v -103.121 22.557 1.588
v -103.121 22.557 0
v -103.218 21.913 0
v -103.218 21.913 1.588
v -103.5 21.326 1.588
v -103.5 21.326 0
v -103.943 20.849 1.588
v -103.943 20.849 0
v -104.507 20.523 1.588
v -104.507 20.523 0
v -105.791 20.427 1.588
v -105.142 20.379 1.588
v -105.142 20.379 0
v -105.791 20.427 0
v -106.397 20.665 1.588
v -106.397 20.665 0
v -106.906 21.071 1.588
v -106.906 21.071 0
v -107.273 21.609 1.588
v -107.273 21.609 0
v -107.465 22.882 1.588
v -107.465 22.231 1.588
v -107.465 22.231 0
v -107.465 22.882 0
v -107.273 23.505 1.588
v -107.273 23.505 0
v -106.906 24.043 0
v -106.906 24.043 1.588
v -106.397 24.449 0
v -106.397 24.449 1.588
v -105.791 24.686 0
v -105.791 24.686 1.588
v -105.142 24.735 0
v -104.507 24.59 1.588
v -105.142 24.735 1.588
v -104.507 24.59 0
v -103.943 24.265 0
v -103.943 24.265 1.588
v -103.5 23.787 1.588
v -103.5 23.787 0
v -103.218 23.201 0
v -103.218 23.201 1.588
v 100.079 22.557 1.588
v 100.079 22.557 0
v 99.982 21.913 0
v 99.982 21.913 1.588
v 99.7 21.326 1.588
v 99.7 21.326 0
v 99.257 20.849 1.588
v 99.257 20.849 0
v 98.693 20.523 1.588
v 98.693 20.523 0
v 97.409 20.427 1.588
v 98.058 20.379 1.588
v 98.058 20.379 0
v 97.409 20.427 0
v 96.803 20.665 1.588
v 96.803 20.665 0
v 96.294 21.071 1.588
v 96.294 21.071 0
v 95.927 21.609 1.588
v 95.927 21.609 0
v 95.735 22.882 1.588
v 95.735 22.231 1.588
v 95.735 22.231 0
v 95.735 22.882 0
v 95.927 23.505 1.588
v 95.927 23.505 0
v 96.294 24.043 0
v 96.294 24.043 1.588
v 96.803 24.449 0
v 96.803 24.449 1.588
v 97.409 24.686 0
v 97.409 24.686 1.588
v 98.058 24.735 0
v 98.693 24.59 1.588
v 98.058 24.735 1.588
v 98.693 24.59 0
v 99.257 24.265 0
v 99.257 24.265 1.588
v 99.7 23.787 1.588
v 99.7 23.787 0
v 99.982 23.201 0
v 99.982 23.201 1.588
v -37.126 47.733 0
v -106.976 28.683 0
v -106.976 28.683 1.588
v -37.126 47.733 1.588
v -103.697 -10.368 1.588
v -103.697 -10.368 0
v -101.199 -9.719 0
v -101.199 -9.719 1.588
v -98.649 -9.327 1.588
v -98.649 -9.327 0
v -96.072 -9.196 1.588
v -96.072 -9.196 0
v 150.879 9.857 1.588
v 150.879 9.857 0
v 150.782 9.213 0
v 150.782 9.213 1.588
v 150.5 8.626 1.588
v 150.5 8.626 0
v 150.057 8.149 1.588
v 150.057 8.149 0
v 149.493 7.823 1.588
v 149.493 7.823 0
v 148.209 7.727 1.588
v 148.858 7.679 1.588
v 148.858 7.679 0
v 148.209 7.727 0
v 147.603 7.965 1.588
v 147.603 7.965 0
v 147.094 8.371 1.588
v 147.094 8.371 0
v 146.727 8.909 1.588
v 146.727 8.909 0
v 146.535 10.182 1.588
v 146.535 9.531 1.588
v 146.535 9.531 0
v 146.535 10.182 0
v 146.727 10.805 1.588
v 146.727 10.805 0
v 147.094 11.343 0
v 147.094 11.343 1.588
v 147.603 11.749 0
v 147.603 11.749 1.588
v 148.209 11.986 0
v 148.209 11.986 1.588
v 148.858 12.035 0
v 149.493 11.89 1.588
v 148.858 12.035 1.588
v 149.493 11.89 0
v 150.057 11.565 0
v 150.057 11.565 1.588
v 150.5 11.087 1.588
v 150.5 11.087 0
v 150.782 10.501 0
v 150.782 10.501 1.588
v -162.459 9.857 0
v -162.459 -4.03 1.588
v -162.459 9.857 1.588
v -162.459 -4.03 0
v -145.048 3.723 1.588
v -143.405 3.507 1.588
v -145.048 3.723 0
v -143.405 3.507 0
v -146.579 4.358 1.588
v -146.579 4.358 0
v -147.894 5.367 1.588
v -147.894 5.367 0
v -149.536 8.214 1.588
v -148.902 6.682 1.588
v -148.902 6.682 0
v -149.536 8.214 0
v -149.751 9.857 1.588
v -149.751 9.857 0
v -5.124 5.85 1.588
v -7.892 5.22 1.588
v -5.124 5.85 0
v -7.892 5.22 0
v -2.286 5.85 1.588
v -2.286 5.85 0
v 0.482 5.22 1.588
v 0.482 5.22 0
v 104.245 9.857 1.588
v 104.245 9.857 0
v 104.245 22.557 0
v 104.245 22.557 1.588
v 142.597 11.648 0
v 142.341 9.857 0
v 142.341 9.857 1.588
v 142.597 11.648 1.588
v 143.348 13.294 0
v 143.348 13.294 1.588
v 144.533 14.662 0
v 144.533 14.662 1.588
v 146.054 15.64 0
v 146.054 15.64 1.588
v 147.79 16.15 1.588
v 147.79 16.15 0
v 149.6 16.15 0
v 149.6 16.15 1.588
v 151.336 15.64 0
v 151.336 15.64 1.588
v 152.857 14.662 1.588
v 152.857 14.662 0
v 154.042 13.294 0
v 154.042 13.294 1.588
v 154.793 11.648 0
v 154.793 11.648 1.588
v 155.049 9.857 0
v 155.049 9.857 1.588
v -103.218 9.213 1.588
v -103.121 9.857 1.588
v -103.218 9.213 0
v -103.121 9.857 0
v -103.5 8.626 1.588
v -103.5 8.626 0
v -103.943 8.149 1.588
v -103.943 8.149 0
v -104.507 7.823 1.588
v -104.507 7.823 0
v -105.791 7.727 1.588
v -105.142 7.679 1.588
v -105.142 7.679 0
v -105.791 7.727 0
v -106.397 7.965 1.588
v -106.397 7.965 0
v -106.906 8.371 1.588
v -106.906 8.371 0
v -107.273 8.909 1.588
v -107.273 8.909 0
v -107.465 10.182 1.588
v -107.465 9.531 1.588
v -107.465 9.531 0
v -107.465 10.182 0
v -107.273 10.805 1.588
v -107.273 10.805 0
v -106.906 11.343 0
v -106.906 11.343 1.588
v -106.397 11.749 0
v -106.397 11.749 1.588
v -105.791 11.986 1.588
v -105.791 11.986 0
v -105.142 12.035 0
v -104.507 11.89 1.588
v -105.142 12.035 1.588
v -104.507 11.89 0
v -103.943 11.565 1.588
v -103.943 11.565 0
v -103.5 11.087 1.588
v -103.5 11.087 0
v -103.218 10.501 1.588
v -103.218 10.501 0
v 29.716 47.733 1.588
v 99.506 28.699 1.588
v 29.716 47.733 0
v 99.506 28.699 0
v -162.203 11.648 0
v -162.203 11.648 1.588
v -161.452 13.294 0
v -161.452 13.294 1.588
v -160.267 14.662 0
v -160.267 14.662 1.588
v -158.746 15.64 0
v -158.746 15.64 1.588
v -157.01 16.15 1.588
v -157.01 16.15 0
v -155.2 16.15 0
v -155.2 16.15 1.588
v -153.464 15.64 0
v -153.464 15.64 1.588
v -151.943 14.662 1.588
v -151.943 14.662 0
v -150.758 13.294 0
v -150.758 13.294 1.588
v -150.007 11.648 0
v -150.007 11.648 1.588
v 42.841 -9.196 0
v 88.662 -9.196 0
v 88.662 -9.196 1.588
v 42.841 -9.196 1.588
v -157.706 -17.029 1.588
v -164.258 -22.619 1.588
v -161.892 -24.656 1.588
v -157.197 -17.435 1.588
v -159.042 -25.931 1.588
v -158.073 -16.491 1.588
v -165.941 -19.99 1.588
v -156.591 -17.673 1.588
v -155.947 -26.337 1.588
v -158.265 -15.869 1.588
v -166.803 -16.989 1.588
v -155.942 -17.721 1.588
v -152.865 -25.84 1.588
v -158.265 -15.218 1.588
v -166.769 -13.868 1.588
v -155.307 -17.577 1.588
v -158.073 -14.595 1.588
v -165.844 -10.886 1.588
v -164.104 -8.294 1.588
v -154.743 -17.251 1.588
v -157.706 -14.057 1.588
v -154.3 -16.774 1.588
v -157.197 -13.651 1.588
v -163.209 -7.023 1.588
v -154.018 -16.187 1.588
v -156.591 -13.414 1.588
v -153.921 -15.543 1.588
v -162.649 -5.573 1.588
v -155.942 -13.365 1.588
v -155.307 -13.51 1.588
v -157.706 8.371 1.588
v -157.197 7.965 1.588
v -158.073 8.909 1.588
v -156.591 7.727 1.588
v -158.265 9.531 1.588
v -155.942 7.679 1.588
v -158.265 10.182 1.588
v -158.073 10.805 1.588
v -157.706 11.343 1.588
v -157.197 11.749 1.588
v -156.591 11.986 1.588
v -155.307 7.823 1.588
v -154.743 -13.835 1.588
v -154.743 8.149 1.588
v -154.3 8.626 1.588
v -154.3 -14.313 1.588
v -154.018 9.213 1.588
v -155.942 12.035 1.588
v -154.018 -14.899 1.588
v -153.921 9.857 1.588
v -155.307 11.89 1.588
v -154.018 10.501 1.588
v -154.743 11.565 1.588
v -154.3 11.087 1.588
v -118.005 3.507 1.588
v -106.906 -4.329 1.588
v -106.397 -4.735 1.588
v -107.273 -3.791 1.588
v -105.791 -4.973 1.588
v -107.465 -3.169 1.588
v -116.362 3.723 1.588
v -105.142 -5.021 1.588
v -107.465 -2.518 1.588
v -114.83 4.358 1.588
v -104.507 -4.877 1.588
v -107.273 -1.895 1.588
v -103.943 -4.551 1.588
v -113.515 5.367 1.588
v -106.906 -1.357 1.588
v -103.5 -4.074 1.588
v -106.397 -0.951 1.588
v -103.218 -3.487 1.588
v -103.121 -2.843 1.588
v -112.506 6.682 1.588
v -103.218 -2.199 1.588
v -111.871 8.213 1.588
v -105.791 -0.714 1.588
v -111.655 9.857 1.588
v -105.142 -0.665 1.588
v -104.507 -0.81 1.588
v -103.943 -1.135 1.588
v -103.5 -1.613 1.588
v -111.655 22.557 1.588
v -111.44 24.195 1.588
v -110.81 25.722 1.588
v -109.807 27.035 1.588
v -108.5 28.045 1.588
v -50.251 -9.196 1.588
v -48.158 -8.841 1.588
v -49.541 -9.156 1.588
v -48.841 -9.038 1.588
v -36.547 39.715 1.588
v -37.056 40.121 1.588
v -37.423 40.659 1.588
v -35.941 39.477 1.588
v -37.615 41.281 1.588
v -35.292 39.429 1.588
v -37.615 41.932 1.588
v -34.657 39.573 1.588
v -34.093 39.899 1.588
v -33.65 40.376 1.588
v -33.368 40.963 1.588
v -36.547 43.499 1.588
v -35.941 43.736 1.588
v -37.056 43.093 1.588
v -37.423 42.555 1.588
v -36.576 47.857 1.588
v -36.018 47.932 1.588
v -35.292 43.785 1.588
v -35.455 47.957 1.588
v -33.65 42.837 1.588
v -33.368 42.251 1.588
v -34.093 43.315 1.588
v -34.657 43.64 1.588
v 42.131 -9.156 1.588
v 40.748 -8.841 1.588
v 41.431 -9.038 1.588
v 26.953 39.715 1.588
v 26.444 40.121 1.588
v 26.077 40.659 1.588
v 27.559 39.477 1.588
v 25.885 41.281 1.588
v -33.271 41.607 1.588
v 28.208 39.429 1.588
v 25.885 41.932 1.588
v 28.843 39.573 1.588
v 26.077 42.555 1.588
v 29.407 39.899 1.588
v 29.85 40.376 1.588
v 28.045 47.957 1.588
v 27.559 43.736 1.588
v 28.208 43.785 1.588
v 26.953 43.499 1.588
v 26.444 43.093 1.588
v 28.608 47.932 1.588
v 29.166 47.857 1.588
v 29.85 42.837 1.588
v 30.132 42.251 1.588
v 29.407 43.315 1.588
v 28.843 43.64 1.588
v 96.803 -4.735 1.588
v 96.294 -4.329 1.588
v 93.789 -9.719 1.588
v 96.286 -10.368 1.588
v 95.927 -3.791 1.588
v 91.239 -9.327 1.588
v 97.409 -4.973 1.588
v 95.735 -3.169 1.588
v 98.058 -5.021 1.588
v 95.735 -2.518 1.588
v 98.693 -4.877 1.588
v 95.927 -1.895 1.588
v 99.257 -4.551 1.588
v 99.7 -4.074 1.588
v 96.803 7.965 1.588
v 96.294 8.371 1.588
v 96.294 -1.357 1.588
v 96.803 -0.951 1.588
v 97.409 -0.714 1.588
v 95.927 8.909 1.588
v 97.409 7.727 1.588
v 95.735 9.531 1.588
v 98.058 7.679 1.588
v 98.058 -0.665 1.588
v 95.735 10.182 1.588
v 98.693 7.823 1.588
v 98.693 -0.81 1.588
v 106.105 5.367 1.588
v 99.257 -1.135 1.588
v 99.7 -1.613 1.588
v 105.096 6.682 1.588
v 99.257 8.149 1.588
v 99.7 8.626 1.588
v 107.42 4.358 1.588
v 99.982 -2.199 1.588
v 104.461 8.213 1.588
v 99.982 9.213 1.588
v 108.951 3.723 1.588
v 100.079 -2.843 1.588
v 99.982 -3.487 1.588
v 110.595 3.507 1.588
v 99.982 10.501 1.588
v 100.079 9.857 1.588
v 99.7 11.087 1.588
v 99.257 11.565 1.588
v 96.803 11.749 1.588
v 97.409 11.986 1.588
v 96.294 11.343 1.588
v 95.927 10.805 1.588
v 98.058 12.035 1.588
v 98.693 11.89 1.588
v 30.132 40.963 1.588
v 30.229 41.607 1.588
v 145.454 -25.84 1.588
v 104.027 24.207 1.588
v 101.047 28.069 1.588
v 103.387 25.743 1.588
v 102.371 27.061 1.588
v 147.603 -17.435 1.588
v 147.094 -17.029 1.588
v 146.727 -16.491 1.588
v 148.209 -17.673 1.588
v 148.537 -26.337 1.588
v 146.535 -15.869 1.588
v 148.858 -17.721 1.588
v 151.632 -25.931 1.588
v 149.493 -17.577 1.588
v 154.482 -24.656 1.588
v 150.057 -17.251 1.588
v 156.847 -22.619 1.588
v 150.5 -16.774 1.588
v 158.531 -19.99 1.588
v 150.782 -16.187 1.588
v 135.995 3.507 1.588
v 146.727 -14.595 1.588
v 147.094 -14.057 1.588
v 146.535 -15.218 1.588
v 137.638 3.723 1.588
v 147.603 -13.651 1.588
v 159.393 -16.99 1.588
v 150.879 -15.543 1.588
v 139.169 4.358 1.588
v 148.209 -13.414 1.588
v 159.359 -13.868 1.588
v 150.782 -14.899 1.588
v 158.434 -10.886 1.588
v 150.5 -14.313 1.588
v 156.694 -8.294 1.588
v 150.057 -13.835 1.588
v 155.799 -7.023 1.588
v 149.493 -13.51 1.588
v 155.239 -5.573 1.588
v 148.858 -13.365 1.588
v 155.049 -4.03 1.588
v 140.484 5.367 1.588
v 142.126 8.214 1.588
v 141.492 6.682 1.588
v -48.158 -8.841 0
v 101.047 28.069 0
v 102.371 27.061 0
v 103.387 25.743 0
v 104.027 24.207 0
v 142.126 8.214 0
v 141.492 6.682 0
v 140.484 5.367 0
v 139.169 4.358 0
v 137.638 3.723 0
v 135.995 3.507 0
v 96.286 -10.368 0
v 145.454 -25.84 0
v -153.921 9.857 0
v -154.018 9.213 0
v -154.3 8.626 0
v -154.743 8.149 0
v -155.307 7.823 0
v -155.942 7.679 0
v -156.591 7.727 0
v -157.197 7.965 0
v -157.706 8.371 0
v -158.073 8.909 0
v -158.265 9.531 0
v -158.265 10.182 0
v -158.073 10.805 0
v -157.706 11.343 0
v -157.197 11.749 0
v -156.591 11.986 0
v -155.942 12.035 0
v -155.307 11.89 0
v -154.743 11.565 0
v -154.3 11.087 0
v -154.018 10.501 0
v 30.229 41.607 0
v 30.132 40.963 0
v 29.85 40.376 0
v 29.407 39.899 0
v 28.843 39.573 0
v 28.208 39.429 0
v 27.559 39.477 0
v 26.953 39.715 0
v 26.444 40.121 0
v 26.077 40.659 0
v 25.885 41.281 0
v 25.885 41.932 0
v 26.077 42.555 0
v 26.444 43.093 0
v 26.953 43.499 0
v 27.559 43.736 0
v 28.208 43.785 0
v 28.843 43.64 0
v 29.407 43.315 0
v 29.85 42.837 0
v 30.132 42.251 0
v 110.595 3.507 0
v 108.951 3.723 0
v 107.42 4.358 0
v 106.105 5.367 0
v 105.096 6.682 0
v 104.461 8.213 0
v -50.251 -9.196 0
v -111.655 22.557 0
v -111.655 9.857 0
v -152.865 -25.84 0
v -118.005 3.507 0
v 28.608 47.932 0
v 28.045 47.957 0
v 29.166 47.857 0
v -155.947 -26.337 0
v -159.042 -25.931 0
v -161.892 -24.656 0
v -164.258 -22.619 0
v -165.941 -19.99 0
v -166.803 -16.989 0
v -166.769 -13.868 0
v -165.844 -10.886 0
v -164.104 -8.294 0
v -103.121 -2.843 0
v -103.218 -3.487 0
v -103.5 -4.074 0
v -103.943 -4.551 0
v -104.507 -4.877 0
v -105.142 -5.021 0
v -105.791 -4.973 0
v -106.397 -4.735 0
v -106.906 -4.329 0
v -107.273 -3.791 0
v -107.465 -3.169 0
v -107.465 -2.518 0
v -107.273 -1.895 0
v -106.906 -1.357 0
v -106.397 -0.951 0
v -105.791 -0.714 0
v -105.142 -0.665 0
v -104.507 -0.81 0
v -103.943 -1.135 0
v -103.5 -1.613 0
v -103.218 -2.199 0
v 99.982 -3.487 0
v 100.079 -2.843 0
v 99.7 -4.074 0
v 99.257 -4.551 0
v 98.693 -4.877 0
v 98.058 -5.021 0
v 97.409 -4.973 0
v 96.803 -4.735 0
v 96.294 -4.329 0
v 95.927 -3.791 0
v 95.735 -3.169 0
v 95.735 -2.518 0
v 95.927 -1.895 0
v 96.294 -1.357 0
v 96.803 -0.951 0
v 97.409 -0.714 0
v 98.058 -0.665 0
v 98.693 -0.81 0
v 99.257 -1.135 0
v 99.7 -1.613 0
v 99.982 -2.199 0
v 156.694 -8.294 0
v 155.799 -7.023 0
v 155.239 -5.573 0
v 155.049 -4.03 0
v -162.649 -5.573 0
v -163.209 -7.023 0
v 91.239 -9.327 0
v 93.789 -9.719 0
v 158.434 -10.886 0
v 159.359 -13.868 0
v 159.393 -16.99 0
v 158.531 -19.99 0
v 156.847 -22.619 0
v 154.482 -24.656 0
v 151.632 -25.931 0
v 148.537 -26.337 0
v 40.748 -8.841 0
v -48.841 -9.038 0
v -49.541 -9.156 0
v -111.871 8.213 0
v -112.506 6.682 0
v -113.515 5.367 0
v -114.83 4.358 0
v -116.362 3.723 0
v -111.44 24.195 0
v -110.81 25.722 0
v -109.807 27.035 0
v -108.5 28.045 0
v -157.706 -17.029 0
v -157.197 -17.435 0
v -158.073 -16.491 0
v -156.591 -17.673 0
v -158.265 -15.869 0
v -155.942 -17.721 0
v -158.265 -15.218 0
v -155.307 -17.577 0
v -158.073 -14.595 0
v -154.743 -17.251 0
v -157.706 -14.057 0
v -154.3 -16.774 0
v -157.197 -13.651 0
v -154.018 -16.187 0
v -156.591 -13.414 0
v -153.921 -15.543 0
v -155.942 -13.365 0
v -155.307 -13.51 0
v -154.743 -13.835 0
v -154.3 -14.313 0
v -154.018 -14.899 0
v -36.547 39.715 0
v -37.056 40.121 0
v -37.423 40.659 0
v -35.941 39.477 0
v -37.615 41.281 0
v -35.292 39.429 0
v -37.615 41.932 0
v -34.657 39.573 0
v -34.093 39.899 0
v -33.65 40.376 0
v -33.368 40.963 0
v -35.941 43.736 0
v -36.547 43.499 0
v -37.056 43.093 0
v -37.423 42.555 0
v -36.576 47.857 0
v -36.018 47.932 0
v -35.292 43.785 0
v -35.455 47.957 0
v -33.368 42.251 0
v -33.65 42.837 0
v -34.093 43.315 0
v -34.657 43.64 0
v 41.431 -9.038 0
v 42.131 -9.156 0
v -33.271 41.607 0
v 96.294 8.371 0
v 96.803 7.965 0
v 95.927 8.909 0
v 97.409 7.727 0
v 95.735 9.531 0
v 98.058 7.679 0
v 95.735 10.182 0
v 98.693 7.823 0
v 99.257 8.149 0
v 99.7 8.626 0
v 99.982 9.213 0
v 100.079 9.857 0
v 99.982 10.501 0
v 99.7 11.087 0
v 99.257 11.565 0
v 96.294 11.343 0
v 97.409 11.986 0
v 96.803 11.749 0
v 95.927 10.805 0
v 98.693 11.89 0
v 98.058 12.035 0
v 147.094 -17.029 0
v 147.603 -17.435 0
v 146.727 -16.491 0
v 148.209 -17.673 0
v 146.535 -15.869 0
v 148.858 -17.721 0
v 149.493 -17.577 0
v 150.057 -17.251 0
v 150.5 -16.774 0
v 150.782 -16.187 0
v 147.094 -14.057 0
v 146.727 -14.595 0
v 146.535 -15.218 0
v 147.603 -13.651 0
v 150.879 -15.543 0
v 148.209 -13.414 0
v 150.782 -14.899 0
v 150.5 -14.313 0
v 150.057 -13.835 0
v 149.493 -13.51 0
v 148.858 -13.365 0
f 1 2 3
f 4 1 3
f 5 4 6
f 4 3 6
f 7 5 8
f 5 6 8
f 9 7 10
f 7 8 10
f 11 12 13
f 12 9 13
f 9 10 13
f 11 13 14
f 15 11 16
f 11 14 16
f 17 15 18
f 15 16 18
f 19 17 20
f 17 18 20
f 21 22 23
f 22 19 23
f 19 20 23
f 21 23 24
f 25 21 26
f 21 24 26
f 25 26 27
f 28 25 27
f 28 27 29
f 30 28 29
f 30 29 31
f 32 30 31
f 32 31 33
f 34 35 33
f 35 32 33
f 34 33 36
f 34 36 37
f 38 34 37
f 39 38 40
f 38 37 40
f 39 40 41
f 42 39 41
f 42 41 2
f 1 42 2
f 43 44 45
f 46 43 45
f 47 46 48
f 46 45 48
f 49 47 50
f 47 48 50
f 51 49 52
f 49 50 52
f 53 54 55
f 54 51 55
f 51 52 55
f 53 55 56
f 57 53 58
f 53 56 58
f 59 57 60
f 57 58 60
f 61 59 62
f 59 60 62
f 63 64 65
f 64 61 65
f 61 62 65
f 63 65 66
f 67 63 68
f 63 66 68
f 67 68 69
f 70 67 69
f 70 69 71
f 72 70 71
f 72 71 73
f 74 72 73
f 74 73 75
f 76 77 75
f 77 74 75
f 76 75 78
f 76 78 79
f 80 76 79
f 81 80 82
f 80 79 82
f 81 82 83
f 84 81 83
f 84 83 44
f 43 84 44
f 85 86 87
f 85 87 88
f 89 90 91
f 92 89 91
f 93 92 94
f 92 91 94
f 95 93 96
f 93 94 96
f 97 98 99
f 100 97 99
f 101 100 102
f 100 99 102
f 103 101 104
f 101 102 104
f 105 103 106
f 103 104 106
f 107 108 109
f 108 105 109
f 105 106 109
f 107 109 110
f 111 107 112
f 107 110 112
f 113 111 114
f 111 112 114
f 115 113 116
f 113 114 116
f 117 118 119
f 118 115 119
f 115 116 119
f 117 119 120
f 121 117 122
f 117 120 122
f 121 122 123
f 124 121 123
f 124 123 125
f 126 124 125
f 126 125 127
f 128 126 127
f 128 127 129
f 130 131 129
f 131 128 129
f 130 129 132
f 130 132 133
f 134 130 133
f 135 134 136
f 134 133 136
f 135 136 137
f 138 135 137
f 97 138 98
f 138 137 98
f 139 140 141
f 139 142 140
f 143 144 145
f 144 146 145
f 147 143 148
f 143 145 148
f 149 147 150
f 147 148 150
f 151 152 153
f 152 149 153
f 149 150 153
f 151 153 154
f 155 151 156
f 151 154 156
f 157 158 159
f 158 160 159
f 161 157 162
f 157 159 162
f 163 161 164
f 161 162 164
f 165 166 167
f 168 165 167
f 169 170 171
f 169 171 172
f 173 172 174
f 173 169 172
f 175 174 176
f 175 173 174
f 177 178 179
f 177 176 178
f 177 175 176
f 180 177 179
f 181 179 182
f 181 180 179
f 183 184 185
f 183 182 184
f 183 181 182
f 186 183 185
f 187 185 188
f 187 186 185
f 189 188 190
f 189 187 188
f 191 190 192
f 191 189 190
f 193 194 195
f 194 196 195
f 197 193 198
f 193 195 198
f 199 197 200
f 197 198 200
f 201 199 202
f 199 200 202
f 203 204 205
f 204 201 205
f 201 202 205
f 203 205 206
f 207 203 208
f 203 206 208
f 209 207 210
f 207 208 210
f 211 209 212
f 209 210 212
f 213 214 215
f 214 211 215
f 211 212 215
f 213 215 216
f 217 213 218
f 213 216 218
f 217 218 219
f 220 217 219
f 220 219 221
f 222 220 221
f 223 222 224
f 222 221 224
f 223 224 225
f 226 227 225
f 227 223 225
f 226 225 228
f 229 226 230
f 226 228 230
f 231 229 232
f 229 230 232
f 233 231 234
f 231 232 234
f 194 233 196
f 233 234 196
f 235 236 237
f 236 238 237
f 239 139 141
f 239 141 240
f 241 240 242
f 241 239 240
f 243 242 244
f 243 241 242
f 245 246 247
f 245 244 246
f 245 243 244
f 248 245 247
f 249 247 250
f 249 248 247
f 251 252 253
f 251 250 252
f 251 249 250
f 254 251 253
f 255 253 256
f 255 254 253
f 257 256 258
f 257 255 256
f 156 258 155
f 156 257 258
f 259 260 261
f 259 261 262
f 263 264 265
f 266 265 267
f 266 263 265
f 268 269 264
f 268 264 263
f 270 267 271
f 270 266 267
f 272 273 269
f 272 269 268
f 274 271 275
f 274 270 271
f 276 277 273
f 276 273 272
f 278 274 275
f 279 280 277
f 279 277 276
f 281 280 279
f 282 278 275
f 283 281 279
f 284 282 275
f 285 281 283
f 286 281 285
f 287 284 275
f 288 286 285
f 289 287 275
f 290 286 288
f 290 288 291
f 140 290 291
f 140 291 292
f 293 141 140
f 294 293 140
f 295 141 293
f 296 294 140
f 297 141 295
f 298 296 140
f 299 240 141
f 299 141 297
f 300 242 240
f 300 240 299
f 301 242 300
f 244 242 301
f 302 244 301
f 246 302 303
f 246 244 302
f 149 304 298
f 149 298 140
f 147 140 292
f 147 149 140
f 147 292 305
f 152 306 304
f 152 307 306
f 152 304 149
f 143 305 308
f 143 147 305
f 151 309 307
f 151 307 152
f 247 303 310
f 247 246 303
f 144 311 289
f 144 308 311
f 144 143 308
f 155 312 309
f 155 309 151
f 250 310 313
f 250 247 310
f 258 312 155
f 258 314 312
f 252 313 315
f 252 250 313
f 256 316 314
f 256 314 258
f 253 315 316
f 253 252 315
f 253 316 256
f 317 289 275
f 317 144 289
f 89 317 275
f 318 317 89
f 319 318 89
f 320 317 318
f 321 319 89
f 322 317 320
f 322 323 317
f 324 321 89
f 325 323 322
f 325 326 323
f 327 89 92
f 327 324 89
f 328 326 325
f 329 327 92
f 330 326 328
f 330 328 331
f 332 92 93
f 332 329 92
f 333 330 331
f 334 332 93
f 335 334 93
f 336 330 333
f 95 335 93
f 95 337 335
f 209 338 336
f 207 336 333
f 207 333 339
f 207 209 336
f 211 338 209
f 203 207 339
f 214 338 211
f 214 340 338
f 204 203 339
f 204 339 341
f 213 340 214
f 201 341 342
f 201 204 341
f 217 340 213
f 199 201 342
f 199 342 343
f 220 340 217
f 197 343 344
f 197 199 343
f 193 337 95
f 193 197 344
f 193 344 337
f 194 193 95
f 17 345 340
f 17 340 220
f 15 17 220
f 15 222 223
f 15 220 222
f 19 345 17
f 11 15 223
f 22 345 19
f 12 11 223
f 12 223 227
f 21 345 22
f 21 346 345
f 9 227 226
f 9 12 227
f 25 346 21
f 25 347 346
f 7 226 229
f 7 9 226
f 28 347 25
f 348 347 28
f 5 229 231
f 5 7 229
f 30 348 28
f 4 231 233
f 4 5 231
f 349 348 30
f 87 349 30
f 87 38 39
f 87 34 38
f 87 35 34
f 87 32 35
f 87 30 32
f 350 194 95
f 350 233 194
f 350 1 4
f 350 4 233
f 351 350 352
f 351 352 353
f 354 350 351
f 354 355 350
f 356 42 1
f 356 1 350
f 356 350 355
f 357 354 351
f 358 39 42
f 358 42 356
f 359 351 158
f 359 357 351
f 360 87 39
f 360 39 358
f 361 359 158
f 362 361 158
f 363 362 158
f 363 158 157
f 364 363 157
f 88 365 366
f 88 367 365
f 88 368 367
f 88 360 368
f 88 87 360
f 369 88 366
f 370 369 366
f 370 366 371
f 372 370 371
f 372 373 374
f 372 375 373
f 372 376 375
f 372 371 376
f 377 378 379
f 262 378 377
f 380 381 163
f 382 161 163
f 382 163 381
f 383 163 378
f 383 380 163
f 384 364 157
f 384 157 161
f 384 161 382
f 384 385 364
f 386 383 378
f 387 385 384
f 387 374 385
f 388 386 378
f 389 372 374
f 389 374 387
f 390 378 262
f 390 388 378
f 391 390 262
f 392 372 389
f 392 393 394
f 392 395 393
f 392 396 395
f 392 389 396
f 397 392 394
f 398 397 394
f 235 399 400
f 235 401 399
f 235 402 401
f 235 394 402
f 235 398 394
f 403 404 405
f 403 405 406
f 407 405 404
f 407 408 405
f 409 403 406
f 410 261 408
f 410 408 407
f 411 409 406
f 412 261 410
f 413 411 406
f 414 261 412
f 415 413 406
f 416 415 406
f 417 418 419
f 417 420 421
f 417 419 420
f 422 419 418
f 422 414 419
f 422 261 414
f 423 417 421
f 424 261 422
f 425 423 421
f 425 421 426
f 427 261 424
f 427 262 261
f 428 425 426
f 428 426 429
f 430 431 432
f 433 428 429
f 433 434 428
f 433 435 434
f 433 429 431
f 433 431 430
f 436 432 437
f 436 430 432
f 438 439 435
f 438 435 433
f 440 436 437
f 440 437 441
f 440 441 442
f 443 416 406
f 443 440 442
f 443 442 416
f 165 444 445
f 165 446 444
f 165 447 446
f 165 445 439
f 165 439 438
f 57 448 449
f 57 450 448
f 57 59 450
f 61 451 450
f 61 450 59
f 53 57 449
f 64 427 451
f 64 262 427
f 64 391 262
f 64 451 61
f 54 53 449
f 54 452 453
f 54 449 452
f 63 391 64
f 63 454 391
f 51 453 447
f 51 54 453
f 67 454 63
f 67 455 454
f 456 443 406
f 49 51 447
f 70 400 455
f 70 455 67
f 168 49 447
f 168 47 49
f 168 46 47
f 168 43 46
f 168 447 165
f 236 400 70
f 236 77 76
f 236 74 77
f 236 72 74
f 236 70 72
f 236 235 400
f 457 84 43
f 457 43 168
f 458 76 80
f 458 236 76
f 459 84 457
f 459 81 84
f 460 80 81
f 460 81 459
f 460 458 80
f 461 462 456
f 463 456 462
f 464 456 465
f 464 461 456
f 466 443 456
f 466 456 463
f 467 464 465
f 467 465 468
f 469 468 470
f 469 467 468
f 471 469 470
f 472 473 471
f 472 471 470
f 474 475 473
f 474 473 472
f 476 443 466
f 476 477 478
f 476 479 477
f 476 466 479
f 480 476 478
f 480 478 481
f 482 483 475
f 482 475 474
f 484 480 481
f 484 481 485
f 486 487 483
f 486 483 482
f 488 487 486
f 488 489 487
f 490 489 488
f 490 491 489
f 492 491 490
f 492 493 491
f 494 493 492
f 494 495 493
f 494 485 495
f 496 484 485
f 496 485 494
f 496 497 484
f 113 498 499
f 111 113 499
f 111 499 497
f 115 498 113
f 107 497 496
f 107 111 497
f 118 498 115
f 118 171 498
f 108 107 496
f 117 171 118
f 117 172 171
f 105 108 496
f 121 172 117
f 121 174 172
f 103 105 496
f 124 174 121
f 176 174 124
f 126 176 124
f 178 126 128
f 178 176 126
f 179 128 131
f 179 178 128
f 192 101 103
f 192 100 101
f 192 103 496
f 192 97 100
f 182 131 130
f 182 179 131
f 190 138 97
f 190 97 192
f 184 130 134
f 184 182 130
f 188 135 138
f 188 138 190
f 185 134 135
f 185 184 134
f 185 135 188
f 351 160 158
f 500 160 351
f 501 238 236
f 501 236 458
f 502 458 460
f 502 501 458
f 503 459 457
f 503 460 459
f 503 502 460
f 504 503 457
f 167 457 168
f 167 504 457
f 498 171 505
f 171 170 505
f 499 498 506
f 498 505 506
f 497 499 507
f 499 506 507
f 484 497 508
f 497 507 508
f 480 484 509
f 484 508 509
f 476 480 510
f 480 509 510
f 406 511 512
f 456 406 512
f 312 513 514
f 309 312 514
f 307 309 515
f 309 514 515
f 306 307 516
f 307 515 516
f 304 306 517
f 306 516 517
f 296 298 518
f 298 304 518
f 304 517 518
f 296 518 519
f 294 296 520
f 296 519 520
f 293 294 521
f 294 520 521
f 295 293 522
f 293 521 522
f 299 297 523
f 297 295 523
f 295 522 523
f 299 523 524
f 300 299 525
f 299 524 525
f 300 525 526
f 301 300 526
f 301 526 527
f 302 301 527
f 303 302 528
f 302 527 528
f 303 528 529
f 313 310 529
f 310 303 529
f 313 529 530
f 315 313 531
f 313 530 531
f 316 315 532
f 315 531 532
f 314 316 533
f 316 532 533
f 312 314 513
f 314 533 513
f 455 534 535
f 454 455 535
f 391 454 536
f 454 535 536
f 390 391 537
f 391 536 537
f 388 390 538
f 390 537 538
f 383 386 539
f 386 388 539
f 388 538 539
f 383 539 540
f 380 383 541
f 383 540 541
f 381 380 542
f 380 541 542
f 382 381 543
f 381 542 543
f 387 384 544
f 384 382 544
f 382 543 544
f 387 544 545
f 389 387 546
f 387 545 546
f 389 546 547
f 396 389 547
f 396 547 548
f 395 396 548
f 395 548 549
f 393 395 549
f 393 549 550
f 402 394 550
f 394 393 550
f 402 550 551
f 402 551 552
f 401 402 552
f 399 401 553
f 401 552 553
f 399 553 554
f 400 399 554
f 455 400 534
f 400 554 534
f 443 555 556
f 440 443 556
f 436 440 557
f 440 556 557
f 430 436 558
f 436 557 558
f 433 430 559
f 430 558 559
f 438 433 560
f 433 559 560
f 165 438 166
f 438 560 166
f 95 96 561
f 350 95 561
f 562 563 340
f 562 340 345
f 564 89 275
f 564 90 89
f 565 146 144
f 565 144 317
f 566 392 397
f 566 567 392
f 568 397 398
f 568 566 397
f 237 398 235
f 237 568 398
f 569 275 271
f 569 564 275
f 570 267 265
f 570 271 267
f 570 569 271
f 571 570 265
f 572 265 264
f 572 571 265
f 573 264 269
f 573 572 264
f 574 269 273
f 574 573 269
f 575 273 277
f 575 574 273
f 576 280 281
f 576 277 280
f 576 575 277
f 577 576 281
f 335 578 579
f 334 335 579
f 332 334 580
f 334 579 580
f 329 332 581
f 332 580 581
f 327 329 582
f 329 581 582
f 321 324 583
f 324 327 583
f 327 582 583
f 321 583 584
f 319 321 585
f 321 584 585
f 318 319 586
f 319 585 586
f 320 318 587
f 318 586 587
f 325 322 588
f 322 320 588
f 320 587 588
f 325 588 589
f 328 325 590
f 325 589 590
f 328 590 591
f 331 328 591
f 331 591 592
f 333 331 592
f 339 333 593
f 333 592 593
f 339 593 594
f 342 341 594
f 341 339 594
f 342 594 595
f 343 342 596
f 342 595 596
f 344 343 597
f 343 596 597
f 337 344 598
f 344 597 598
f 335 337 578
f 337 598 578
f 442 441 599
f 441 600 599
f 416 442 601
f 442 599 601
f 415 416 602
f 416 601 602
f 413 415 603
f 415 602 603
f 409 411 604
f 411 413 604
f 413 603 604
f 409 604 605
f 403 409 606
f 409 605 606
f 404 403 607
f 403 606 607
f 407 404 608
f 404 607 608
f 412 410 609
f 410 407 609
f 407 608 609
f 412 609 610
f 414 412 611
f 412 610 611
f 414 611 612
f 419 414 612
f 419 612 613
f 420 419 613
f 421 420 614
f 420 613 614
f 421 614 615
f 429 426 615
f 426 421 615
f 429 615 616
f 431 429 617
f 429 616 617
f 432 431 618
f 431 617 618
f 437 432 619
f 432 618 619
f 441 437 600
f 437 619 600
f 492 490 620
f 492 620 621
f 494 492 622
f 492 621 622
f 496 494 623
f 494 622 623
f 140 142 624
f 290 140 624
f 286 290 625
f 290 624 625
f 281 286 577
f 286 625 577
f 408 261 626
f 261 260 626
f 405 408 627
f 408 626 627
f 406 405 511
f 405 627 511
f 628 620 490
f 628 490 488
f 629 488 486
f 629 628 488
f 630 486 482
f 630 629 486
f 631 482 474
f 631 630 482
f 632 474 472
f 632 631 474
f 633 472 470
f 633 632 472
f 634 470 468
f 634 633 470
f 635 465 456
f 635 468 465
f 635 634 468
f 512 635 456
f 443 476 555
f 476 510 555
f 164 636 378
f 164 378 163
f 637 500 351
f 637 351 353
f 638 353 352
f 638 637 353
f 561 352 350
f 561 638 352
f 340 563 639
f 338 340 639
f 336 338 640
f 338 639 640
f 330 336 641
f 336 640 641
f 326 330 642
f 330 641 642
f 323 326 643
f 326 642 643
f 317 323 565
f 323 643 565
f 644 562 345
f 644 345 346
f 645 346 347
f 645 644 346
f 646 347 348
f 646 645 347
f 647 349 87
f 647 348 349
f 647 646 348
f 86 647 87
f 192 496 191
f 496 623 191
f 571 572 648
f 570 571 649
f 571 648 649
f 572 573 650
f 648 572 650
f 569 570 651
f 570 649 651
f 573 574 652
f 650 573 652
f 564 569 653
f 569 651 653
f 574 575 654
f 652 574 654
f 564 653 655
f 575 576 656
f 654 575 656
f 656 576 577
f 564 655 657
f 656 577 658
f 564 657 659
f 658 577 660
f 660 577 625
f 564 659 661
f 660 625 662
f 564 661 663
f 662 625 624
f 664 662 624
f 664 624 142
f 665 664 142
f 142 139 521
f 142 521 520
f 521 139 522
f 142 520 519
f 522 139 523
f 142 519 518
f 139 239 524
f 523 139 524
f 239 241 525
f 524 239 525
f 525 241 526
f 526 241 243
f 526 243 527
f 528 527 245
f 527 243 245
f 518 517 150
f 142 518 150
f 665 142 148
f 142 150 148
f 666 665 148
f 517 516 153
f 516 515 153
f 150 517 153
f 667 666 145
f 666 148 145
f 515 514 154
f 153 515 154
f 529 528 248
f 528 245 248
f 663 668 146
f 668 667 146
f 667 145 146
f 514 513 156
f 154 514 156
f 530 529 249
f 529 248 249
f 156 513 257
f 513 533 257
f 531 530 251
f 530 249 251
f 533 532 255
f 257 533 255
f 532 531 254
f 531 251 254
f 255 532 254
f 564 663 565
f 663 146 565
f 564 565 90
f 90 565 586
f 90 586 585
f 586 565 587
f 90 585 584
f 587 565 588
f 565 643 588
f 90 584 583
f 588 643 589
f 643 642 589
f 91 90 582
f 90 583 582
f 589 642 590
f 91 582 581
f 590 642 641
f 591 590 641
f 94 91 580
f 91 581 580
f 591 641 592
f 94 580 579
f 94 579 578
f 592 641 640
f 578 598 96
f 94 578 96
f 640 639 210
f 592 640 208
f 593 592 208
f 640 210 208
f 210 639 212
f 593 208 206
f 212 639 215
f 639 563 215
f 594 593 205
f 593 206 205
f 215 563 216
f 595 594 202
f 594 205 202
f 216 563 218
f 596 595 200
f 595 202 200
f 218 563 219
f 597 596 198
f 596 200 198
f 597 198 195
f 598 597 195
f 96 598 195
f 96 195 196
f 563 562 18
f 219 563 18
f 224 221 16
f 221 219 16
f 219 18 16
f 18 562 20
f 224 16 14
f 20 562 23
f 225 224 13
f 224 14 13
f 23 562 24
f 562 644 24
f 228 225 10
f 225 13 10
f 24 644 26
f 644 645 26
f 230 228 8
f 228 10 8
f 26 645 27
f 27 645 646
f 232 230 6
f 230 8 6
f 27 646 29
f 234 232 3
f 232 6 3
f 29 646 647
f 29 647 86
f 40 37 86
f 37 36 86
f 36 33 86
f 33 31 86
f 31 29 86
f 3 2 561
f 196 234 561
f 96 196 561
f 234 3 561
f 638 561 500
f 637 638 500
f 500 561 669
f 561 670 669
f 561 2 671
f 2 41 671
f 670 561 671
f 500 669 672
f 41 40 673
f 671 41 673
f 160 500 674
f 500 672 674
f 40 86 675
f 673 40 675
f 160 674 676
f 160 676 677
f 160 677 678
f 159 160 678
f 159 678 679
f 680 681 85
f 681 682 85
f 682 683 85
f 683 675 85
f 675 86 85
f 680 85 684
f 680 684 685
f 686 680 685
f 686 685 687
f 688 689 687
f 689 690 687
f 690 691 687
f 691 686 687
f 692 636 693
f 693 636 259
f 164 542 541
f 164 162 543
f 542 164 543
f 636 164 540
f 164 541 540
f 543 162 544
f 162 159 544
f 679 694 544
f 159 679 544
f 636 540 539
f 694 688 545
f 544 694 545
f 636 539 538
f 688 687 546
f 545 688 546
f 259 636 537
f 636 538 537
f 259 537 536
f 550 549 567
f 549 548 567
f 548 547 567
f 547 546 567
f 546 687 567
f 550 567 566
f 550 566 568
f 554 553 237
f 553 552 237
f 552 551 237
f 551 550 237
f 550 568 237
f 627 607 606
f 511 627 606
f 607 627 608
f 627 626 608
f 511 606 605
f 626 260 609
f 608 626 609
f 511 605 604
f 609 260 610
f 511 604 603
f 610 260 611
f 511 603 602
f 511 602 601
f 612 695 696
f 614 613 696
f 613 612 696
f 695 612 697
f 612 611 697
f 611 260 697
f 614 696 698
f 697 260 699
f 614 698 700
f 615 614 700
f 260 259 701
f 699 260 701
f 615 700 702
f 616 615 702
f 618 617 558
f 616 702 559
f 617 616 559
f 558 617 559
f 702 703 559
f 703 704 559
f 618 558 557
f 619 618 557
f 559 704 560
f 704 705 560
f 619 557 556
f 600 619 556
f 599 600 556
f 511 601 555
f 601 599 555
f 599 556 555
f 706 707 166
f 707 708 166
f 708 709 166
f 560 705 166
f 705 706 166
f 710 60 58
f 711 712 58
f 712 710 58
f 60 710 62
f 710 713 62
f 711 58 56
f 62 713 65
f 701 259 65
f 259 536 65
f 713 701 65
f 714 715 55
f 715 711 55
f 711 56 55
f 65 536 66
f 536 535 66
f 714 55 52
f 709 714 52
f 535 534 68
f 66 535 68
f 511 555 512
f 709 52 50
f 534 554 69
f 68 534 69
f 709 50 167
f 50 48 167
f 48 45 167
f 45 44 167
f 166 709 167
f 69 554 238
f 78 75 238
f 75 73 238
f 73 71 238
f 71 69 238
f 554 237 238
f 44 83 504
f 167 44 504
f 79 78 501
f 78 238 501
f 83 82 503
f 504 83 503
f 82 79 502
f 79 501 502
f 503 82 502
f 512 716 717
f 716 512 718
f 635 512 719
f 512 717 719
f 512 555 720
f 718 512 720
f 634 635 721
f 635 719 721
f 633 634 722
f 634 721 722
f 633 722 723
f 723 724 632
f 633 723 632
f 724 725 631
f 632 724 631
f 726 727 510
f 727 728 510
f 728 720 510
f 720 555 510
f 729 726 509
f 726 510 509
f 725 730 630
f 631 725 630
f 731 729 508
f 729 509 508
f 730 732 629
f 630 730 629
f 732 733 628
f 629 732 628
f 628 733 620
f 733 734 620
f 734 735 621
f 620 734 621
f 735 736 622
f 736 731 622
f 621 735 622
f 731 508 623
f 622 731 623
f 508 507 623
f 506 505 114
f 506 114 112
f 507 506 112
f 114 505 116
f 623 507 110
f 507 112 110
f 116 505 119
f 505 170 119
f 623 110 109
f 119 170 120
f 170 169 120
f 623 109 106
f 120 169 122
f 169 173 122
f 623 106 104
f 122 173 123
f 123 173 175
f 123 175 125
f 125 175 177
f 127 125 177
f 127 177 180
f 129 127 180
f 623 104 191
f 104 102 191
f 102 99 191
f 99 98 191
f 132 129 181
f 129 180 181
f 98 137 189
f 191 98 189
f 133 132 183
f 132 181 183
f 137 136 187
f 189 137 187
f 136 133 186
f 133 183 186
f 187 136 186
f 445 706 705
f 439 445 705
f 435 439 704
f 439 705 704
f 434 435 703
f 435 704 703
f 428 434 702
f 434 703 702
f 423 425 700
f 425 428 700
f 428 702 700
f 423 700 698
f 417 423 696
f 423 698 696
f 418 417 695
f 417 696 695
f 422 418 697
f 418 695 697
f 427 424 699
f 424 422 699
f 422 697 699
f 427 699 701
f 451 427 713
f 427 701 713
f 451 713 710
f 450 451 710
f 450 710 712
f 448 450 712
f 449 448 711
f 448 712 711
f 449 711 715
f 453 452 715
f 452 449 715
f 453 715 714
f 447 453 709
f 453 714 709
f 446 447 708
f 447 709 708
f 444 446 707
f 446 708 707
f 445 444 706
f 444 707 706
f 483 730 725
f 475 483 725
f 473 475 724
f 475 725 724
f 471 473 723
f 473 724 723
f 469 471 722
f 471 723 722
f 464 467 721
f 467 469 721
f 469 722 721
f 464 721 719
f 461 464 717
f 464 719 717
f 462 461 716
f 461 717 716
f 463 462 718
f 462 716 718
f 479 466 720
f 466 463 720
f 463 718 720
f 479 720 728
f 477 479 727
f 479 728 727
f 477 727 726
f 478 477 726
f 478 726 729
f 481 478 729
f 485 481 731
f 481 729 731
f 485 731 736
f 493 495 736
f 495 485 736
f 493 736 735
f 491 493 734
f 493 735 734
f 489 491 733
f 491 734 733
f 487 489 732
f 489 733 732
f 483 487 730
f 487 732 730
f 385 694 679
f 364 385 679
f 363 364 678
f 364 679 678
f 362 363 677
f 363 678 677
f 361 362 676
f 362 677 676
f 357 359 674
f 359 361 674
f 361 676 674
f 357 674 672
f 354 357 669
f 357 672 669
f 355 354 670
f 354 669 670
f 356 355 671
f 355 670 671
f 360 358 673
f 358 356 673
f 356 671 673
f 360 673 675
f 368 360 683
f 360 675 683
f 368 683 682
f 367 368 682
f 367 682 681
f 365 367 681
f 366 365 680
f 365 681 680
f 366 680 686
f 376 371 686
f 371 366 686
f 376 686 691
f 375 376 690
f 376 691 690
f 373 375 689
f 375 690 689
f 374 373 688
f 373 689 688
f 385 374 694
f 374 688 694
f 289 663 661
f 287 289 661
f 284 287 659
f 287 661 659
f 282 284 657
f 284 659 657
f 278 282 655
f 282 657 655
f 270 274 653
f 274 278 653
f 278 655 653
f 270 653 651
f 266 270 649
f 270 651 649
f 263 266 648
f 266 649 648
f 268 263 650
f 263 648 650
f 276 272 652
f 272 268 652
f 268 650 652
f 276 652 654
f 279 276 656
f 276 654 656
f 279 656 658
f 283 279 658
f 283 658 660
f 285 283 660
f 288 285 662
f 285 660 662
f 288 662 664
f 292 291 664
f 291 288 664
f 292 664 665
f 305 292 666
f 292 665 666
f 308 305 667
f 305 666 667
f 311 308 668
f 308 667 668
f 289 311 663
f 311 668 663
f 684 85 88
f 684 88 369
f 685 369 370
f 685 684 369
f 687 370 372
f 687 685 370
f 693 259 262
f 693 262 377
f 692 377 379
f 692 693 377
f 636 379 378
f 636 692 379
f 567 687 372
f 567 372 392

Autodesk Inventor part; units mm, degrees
ref_plane "YZ Plane" through (0, 0, 0) normal (1, 0, 0) x (0, 1, 0)
ref_plane "XZ Plane" through (0, 0, 0) normal (0, 1, 0) x (-1, 0, 0)
ref_plane "XY Plane" through (0, 0, 0) normal (0, 0, 1) x (1, 0, 0)
sketch "Sketch1" plane through (0, 0, 0) normal (0, 0, 1) x (1, 0, 0)
  arc A0 (155.049, 9.8568) -> (142.3409, 9.8568) centre (148.6949, 9.8608) ccw
  circle A1 centre (148.6949, 9.8568) radius 2.1844
  circle A2 centre (148.6949, -15.5432) radius 2.1844
  line L0 (155.049, -4.0298) -> (155.049, 9.8568)
  arc A3 (155.049, -4.0298) -> (156.6938, -8.2941) centre (161.399, -4.0298) ccw
  arc A4 (145.4545, -25.8404) -> (156.6938, -8.2941) centre (148.6949, -15.5432) ccw
  arc A5 (135.9949, 3.5068) -> (142.3409, 9.8568) centre (135.9949, 9.8527) ccw
  line L1 (135.9949, 3.5068) -> (110.5949, 3.5068)
  arc A6 (104.2449, 9.8568) -> (110.5949, 3.5068) centre (110.5949, 9.8568) ccw
  line L2 (104.2449, 9.8568) -> (104.2449, 22.5568)
  circle A7 centre (97.8949, 9.8568) radius 2.1844
  circle A8 centre (97.8949, -2.8432) radius 2.1844
  circle A9 centre (97.8949, 22.5568) radius 2.1844
  circle A10 centre (-105.3051, 9.8568) radius 2.1844
  circle A11 centre (-105.3051, -2.8432) radius 2.1844
  circle A12 centre (-105.3051, 22.5568) radius 2.1844
  circle A13 centre (-156.1051, 9.8568) radius 2.1844
  circle A14 centre (-156.1051, -15.5432) radius 2.1844
  arc A15 (-164.1039, -8.2941) -> (-152.8646, -25.8404) centre (-156.1051, -15.5432) ccw
  line L3 (-162.4591, -4.0298) -> (-162.4591, 9.8568)
  arc A16 (-164.1039, -8.2941) -> (-162.4591, -4.0298) centre (-168.8091, -4.0298) ccw
  arc A17 (-149.751, 9.8568) -> (-162.4591, 9.8568) centre (-156.1051, 9.8608) ccw
  arc A18 (-149.751, 9.8568) -> (-143.4051, 3.5068) centre (-143.4051, 9.8527) ccw
  line L4 (-143.4051, 3.5068) -> (-118.0051, 3.5068)
  arc A19 (-118.0051, 3.5068) -> (-111.6551, 9.8568) centre (-118.0051, 9.8568) ccw
  line L5 (-111.6551, 9.8568) -> (-111.6551, 22.5568)
  circle A20 centre (-35.4551, 41.6068) radius 2.1844
  circle A21 centre (28.0449, 41.6068) radius 2.1844
  line L6 (-35.4551, 47.9568) -> (28.0449, 47.9568)
  line L7 (99.506, 28.699) -> (29.7157, 47.733)
  arc A22 (0.4819, 5.2197) -> (-7.892, 5.2197) centre (-3.7051, -6.7703) ccw
  arc A23 (40.7475, -8.8412) -> (42.841, -9.1962) centre (42.841, -2.8462) ccw
  line L8 (40.7475, -8.8412) -> (0.4819, 5.2197)
  arc A24 (-50.2511, -9.1962) -> (-48.1577, -8.8412) centre (-50.2511, -2.8462) ccw
  line L9 (-7.892, 5.2197) -> (-48.1577, -8.8412)
  arc A25 (104.2449, 22.5568) -> (99.506, 28.699) centre (97.8949, 22.5568) ccw
  line L10 (-106.9759, 28.683) -> (-37.1259, 47.733)
  arc A26 (-35.4551, 47.9568) -> (-37.1259, 47.733) centre (-35.4551, 41.6068) ccw
  arc A27 (29.7157, 47.733) -> (28.0449, 47.9568) centre (28.0449, 41.6068) ccw
  arc A28 (-106.9759, 28.683) -> (-111.6551, 22.5568) centre (-105.3051, 22.5568) ccw
  arc A29 (-96.072, -9.1962) -> (-103.6966, -10.3676) centre (-96.072, -34.5962) ccw
  arc A30 (96.2864, -10.3676) -> (88.6619, -9.1962) centre (88.6619, -34.5962) ccw
  line L11 (-103.6966, -10.3676) -> (-152.8646, -25.8404)
  line L12 (-96.072, -9.1962) -> (-50.2511, -9.1962)
  line L13 (88.6619, -9.1962) -> (42.841, -9.1962)
  line L14 (96.2864, -10.3676) -> (145.4545, -25.8404)
  point P0 (0, 0)
  dimension "d0" = 12.7
  dimension "d1" = 6.35
  dimension "d2" = 6.35
  dimension "d3" = 25.4
  dimension "d4" = 25.4
extrude "Extrusion1" add sketch "Sketch1" along normal blind 1.5875
properties part number "backaligner"
